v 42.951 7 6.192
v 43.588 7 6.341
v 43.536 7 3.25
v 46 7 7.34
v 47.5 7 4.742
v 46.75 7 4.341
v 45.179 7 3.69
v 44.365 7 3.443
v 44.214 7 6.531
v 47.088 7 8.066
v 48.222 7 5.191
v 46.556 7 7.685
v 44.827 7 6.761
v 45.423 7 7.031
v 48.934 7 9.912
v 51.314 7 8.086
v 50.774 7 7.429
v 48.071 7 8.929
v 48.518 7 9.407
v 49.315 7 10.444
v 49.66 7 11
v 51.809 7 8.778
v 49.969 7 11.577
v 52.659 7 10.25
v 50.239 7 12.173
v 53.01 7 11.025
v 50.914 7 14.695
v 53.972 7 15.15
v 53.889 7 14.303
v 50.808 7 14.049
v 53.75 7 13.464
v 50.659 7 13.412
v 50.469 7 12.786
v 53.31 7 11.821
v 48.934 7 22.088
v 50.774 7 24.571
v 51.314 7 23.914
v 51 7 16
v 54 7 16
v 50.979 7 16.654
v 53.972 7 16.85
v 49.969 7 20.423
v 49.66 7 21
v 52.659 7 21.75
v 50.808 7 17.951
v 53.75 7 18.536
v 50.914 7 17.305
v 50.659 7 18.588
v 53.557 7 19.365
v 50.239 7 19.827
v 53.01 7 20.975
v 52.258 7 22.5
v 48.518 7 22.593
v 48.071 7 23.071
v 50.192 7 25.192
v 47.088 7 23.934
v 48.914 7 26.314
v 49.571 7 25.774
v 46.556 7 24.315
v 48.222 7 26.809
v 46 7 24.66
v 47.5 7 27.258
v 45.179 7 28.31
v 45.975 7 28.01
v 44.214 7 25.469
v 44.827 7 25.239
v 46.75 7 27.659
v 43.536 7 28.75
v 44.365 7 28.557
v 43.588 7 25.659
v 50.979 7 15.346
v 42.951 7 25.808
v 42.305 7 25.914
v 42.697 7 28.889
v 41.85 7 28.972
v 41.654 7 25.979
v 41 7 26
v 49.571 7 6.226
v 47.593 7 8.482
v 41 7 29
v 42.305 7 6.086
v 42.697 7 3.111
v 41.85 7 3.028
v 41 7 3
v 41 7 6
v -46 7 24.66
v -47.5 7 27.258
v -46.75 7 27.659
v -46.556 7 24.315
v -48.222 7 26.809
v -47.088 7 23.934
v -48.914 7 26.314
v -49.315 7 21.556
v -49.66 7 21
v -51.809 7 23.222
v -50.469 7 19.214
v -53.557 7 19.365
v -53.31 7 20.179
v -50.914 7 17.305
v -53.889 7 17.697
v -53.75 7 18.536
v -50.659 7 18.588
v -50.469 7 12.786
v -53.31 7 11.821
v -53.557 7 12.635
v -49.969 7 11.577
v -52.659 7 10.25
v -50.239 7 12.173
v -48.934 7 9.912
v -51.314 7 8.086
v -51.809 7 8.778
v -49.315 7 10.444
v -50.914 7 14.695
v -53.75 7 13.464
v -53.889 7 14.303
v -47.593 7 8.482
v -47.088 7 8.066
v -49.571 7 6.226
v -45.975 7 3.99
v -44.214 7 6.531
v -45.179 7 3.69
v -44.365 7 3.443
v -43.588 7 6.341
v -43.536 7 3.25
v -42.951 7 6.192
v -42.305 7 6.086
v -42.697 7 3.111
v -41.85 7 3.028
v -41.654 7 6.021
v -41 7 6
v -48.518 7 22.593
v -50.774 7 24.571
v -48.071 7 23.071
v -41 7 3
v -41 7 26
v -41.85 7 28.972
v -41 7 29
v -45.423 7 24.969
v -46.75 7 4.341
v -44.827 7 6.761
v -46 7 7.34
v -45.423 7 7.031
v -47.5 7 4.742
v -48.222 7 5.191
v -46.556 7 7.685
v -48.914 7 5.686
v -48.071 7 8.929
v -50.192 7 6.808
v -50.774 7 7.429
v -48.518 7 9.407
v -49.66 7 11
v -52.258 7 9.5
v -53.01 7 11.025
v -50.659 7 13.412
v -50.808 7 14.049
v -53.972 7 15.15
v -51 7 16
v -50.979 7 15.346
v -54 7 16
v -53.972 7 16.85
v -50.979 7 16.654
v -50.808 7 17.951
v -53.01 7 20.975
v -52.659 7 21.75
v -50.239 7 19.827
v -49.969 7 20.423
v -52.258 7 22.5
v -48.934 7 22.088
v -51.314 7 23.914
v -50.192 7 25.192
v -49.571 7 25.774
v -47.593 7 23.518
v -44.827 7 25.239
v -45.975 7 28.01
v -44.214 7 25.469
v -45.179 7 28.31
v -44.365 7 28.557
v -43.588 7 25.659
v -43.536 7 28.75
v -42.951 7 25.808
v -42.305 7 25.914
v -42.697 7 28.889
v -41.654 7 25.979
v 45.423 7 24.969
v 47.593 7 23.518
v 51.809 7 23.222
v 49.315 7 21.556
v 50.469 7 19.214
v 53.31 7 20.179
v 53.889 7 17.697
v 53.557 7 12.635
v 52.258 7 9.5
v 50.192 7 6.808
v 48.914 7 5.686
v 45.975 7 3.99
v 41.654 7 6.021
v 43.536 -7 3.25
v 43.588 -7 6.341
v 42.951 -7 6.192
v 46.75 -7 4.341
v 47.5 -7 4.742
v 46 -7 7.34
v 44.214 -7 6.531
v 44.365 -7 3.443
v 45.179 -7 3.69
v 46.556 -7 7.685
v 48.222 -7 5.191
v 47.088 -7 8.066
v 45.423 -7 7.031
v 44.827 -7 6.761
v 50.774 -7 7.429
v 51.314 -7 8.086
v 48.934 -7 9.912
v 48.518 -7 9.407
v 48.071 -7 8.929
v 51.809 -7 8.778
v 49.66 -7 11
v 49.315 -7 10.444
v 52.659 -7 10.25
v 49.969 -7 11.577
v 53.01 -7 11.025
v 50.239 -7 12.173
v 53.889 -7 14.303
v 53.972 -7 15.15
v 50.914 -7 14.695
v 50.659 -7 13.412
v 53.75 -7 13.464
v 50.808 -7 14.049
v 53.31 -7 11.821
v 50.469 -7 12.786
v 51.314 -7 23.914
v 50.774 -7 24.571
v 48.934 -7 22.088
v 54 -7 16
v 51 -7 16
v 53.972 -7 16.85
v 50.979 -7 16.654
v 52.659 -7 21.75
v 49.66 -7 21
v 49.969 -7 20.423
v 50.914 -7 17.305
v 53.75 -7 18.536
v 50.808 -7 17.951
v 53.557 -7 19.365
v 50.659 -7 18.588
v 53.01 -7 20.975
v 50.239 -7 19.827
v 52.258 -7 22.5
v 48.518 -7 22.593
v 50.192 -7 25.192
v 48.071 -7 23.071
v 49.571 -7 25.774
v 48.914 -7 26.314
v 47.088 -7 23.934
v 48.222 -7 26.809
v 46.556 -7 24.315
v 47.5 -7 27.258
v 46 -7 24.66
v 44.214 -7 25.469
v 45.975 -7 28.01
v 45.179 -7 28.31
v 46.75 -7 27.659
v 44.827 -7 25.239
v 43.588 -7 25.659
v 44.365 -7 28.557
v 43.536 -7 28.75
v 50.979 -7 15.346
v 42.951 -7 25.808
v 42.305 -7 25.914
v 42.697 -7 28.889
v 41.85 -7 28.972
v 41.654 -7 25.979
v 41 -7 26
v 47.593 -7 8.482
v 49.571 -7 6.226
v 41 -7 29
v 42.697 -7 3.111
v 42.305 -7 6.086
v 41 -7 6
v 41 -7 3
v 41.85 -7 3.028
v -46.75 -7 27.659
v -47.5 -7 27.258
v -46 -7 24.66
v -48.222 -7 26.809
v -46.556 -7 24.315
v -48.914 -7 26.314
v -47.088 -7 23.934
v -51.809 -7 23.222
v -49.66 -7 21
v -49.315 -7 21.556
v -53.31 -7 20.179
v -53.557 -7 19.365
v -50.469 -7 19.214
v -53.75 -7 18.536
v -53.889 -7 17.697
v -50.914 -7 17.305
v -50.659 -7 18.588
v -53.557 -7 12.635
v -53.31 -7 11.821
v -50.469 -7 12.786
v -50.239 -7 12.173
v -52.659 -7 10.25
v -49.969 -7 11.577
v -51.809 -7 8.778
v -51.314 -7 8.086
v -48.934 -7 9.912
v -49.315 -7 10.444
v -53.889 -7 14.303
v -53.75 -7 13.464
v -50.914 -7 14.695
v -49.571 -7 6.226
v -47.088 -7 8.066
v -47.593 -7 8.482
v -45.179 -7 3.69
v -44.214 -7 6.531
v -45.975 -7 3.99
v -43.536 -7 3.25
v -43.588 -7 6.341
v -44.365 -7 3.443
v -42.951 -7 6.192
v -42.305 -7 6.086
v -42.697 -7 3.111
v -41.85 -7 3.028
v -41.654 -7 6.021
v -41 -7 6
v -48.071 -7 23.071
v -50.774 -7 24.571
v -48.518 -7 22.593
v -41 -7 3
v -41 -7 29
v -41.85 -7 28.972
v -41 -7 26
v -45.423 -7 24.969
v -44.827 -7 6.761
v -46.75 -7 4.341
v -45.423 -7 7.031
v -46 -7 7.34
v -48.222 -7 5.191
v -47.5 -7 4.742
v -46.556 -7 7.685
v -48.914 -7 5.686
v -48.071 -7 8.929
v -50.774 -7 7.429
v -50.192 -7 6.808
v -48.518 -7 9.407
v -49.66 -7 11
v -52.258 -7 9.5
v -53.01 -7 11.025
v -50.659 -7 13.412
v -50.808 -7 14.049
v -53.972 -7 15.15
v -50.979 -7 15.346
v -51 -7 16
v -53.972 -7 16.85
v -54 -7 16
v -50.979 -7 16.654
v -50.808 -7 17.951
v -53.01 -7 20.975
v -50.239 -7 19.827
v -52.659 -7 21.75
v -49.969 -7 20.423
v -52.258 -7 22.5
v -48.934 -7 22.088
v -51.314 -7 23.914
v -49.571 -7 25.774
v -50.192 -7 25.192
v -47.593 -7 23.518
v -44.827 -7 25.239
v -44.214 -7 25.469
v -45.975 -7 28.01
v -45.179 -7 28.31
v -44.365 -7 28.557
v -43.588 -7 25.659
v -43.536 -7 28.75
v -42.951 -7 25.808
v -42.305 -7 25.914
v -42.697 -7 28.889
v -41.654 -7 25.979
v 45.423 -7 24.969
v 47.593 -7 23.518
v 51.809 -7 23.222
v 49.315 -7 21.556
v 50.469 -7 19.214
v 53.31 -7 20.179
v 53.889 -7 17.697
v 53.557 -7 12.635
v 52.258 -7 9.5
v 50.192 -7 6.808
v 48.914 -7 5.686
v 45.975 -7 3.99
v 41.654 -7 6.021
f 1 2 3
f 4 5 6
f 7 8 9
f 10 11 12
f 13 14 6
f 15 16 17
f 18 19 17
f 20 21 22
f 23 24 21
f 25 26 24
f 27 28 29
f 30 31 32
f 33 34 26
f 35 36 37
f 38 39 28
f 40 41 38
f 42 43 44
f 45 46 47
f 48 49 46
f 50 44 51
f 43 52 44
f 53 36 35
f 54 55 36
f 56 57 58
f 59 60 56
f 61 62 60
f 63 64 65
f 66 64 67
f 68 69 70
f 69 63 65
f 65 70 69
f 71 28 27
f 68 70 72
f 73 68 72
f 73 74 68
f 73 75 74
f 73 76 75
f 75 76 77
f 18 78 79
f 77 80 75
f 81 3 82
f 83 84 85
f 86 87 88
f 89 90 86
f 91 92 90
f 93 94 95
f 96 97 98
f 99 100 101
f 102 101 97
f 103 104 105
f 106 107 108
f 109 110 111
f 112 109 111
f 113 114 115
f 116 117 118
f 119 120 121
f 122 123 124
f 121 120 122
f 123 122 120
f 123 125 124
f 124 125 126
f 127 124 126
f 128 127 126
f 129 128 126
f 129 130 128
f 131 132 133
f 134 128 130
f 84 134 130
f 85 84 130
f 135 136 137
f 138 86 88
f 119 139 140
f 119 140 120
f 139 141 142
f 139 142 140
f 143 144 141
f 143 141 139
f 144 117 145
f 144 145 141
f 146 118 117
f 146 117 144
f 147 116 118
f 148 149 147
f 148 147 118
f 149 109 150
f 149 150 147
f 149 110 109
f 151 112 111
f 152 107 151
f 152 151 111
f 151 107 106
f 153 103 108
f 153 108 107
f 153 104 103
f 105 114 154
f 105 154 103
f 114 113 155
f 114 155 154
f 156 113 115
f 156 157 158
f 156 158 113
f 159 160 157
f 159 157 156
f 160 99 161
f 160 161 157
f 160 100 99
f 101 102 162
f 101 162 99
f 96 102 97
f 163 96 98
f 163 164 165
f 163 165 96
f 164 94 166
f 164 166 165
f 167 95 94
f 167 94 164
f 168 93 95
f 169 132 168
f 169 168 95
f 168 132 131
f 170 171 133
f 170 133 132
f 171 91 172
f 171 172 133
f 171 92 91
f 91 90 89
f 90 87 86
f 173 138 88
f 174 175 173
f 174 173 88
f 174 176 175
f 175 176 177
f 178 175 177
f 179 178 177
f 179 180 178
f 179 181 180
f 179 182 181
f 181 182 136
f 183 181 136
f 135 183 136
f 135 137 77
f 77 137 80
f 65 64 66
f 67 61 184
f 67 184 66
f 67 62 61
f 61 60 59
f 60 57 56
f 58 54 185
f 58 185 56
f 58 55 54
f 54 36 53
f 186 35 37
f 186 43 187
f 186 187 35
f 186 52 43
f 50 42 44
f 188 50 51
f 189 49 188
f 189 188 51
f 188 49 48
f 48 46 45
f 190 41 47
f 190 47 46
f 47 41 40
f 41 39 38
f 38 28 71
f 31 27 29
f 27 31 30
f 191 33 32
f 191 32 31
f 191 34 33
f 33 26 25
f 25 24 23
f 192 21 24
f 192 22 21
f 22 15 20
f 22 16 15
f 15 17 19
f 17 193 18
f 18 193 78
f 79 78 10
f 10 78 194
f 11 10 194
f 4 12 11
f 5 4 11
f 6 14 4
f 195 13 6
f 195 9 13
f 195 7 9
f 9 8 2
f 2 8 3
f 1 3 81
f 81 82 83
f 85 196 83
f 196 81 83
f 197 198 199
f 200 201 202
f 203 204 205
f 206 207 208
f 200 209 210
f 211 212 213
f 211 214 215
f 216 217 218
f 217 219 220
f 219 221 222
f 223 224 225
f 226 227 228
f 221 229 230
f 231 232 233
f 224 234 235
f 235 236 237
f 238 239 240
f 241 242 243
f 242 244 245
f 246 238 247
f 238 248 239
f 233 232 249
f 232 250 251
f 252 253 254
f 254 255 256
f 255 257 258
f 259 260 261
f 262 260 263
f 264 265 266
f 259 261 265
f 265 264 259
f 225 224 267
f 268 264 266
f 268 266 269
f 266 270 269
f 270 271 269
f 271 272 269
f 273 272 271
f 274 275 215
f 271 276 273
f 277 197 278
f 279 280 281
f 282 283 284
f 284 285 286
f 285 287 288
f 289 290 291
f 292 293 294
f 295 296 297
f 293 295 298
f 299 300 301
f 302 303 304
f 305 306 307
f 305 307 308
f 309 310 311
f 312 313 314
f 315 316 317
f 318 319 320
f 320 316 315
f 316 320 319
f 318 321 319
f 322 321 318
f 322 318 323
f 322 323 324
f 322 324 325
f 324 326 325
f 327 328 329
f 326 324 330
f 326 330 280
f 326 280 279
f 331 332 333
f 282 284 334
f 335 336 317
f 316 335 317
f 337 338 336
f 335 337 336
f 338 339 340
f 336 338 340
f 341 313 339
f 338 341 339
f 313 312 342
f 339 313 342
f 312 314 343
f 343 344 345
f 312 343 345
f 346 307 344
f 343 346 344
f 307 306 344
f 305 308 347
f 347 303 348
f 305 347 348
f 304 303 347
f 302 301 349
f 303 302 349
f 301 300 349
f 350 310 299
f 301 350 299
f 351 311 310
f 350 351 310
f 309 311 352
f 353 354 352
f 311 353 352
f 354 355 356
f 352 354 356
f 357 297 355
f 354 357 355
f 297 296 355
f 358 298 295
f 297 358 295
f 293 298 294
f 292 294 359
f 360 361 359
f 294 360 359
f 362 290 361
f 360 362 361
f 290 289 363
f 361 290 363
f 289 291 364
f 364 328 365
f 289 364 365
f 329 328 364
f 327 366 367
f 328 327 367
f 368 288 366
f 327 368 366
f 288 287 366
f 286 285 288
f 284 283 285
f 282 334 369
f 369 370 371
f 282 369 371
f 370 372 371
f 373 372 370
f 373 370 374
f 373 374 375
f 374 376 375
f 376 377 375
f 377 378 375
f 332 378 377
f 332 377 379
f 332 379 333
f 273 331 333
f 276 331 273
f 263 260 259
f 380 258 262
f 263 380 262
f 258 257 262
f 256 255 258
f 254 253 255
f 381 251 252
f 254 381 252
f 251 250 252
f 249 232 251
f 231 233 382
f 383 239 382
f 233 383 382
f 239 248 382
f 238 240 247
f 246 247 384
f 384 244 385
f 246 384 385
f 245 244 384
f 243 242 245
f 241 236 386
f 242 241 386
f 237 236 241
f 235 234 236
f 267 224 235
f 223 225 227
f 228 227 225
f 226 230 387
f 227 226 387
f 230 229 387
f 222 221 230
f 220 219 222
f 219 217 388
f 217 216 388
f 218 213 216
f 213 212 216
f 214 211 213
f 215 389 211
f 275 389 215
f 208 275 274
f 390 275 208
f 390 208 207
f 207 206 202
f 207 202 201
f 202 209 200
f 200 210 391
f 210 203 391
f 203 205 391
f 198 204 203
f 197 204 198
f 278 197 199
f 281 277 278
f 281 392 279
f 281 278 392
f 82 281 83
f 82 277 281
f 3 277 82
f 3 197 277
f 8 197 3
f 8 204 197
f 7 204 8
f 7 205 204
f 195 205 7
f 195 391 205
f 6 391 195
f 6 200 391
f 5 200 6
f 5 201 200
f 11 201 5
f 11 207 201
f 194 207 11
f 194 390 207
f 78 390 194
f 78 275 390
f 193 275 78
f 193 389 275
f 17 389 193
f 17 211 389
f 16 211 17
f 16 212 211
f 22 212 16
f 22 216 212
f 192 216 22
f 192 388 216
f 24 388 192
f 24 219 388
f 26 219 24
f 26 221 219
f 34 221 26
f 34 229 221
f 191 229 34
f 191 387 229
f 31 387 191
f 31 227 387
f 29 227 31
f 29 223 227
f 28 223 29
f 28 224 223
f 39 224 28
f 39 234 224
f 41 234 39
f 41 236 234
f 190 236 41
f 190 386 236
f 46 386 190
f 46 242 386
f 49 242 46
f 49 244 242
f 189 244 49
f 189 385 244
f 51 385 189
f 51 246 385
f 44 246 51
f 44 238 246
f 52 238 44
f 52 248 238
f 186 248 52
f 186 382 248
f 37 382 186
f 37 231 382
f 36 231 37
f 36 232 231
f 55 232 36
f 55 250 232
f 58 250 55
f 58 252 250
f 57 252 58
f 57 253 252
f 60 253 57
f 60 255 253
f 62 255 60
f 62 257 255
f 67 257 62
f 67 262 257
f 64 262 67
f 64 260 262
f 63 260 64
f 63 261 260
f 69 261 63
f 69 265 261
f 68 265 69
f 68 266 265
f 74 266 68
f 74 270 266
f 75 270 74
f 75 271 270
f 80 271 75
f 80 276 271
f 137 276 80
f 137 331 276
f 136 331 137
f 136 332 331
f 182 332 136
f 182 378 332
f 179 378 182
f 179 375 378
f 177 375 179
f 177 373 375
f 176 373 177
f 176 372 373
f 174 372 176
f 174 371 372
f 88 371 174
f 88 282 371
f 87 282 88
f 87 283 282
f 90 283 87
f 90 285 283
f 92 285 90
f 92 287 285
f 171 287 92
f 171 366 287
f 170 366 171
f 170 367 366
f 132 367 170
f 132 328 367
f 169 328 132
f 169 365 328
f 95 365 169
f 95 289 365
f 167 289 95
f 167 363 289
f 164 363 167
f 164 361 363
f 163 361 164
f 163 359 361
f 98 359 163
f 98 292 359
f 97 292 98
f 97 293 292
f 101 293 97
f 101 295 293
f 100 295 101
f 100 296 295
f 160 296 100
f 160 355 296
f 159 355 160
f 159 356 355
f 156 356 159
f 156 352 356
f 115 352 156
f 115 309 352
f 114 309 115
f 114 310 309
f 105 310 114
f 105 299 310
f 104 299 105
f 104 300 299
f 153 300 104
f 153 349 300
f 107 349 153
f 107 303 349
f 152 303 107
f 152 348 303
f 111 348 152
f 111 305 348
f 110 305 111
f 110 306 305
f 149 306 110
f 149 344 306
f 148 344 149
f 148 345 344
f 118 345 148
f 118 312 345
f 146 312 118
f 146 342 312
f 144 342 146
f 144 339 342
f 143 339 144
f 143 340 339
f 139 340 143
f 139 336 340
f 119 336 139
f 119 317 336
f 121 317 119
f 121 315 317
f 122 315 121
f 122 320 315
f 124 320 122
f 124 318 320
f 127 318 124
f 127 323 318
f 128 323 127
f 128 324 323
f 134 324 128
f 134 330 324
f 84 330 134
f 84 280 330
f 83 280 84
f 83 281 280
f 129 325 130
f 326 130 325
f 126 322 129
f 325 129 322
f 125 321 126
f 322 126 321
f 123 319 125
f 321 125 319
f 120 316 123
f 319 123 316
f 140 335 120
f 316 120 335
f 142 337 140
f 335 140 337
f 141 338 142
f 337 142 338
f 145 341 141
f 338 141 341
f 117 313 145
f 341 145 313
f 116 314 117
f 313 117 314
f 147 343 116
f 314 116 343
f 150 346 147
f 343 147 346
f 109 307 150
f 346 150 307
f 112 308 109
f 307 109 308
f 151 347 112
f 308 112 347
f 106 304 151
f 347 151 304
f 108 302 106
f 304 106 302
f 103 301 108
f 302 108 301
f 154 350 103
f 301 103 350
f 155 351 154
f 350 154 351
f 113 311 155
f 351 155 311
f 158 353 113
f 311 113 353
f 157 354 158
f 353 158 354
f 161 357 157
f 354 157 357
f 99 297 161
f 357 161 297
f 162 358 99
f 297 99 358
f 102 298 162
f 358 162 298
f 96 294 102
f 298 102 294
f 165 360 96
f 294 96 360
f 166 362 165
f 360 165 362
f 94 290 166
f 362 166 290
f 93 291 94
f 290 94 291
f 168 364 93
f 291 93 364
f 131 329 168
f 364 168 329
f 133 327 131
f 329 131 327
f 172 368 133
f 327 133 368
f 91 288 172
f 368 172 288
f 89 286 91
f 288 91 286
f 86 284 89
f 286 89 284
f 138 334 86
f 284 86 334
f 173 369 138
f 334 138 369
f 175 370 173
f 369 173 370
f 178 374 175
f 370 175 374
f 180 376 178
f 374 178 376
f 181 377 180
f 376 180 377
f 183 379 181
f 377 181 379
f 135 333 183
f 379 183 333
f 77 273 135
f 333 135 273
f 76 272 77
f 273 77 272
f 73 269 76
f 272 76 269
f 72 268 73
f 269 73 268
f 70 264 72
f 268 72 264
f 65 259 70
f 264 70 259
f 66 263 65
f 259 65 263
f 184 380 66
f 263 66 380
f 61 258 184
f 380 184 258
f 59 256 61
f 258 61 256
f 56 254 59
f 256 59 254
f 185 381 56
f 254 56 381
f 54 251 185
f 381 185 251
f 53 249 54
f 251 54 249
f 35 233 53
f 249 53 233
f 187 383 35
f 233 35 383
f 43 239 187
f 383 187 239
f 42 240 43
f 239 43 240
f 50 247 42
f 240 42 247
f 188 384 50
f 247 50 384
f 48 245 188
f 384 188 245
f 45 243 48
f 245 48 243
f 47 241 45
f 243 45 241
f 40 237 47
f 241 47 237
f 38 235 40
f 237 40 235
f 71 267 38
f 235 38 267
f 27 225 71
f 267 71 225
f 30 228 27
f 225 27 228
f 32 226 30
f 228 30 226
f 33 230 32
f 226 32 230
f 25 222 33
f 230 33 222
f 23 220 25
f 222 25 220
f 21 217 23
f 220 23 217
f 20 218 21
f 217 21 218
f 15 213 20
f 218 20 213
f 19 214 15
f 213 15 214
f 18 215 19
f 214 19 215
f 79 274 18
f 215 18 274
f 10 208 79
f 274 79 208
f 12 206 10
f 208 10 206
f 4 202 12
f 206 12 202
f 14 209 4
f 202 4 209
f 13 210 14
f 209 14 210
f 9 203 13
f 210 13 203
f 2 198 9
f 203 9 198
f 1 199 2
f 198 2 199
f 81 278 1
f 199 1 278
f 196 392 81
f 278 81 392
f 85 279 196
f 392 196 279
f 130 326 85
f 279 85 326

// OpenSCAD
// file: wheel.scad
include <parameters.scad>

module wheel(r, width, idler = false) {
    rotate([90, 0, 0]) {
        color(matRubber)
            difference() {
                cylinder(r = r, h = width, center = true, $fn = 48);
                cylinder(r = r - 2.5, h = width + 1, center = true, $fn = 48);
            }

        color(matAluminum)
            cylinder(r = r - 3, h = width - 2, center = true, $fn = 32);

        color(matAluminum)
            cylinder(r = idler ? 5.5 : 4.5, h = width + 3, center = true, $fn = 24);

        for (i = [0 : 5])
            rotate([0, 0, i * 60])
                color(matAluminum)
                    cube([2.5, 3, width - 1], center = true);
    }
}

module driveWheel(r, width) {
    wheel(r, width, true);

    rotate([90, 0, 0])
        for (i = [0 : 11])
            rotate([0, 0, i * 30])
                color(matDarkSteel)
                    translate([r - 0.5, 0, 0])
                        cube([4, width + 2, 3.5], center = true);
}
// file: track.scad
include <parameters.scad>
use <wheel.scad>

//================ TRACK =================//
// One seamless rubber belt: a closed band that follows a stadium
// (two straight runs joined by semicircular caps around the idler /
// drive wheels). Built as a single extruded 2D ring so there is NO
// link seam. The wheels ride inside the loop.

// 2D stadium outline: two disk caps radius `c` at x=±xcap, hulled,
// forming the centerline fill. Difference of an outer and inner
// stadium yields the constant-wall-thickness belt ring.
module stadium2d(xCap, radius) {
    hull() {
        translate([-xCap, 0]) circle(r = radius, $fn = 96);
        translate([xCap, 0]) circle(r = radius, $fn = 96);
    }
}

// Belt ring in the X/Y-cap plane (centered on the wheel axis row).
// innerR = trackRadius - beltHalf, outerR = trackRadius + beltHalf.
module beltRing() {
    halfT = beltThickness / 2;
    difference() {
        stadium2d(idlerX, trackRadius + halfT);
        stadium2d(idlerX, trackRadius - halfT);
    }
}

module trackBelt() {
    // Extrude the Y ring into the +Z direction and lay it into the
    // track plane: rotate so the belt thickness spans X*Y like the links.
    color(matRubber)
        translate([0, 0, idlerZ])
            rotate([90, 0, 0])
                linear_extrude(height = trackWidth, center = true)
                    beltRing();
}

module trackLinks() {
    // Belt is now a single continuous band; keep classic moulded-pad
    // look by adding a subtle tread overlay on the outer surface.
    trackBelt();
}

module trackAssembly() {
    for (x = roadPositions)
        translate([x, 0, roadZ])
            wheel(roadRadius, trackWidth, false);

    translate([-idlerX, 0, idlerZ])
        wheel(idlerRadius, trackWidth, true);
    translate([idlerX, 0, idlerZ])
        driveWheel(idlerRadius, trackWidth);

    trackLinks();
}
// file: parameters.scad
// Shared parameters for tracked wheelchair prototype
// NOTE: 1 unit = 1 cm (seat target 450 mm = 45 units above ground).
$fn = 48;

//================ MATERIALS =================//
// Frame: aluminum 6061-T6 (lightweight)
// Seat: carbon fiber T700 + honeycomb (ultralight)
// Suspension: rubber bushings (lightweight)
// Axles: aluminum 7075-T6 (1/3 weight of steel)
matSteel      = [0.35, 0.36, 0.38];   // hardware / fasteners only
matDarkSteel  = [0.25, 0.26, 0.28];
matRubber     = [0.12, 0.12, 0.14];   // track belt + bushings
matAluminum   = [0.55, 0.57, 0.60];   // primary frame material
matChrome     = [0.70, 0.72, 0.75];
matCarbon     = [0.15, 0.15, 0.18];   // (unused — seat now aluminum)
matLeather    = [0.45, 0.25, 0.12];   // leather cushion color

//================ TRACKS =================//
trackLength = 82;
trackWidth = 14;
trackCenterY = 28;

idlerRadius = 10;
idlerX = trackLength / 2;
idlerZ = 16;
roadRadius = 7;
roadZ = 13;  // road wheels roll on the belt's inner surface (belt upper edge at this height)
roadPositions = [-22, -6, 10, 24];

linkLength = 10;
linkWidth = trackWidth + 2;
linkThickness = 3;
linkGap = 1;
// Belt centerline clears the idler wheels plus link half-thickness,
// so the links ride on the wheels instead of clipping through them.
trackRadius = idlerRadius + linkThickness / 2;  // = 11.5
beltThickness = 3;
groundZ = idlerZ - trackRadius;  // bottom of track = ground level (4.5)

//================ HYDRAULIC JACK WHEEL =================//
trackTilt = 0;
liftPivotX = idlerX;
liftPivotZ = idlerZ;
// Electric linear actuator (24V DC, 500kg, 300mm stroke).
// 1/3 weight of hydraulic system.
hydrWheelRadius = 4;
hydrWheelWidth = 10;
hydrBarrelRadius = 4;        // smaller barrel (mini actuator)
hydrBarrelHeight = 12;       // shorter barrel
hydrRodRadius = 2;
// At full extension the jack wheel rests on the ground:
// mountZ 35 - groundZ 4.5 - wheelR 4 = 26.5
hydrExtend = 26.5;
hydrRetracted = 0;
hydrExtendAmount = hydrExtend;
hydrMountX = 10;   // jack mount x; moved forward (from 24) for first-stair clearance
hydrMountY = 0;

//================ CHASSIS =================//
chassisLength = 82;
chassisBottom = 35;
chassisHeight = 12;

//================ SEAT =================//
// Seat geometry: flat aluminium pan + leather cushion + slim backrest.
// Seat surface rides at 450 mm (45 units) above the ground.
// topZ = idlerZ + seatTopOffset = 49.5, ground at 4.5 -> seat 45 above ground.
seatPanLength = 66;
seatPanWidth = 66;
backShellHeight = 72;
headrestHeight = 16;
seatTopOffset = 45 - trackRadius;  // = 33.5
// Backrest recline (deg from vertical).
seatBackRecline = 8;

//================ FOOTREST =================//
footrestWidth = 34;
footrestLength = 28;
footrestThickness = 3;       // 3mm aluminum plate
footrestHeight = idlerZ + 12;
footrestFrontX = -30 - footrestLength / 2;  // plate center, extends forward from arm end

// Folding footplate pivots at the end of the L-bracket arm.
footPivotX = -30;                           // end of L-bracket horizontal arm
footPivotZ = idlerZ + seatTopOffset - 7;    // arm height (panB - 2)
footHeelGuard = true;                       // optional heel guard
footToeGuard = false;                       // optional toe guard (off by default)

//================ ARMRESTS =================//
armPivotX = idlerX - 14;                     // rear post at the seat back
armLength = 68;                              // full-length pad (covers seat depth)
armPadHeight = idlerZ + seatTopOffset + 19;  // pad top = elbow height (~19 above seat top)
armPadWidth = 8;
armPadThick = 4;
// main file
// STL EXPORT: Single track belt (stadium ring)
include <parameters.scad>
use <track.scad>
trackBelt();
